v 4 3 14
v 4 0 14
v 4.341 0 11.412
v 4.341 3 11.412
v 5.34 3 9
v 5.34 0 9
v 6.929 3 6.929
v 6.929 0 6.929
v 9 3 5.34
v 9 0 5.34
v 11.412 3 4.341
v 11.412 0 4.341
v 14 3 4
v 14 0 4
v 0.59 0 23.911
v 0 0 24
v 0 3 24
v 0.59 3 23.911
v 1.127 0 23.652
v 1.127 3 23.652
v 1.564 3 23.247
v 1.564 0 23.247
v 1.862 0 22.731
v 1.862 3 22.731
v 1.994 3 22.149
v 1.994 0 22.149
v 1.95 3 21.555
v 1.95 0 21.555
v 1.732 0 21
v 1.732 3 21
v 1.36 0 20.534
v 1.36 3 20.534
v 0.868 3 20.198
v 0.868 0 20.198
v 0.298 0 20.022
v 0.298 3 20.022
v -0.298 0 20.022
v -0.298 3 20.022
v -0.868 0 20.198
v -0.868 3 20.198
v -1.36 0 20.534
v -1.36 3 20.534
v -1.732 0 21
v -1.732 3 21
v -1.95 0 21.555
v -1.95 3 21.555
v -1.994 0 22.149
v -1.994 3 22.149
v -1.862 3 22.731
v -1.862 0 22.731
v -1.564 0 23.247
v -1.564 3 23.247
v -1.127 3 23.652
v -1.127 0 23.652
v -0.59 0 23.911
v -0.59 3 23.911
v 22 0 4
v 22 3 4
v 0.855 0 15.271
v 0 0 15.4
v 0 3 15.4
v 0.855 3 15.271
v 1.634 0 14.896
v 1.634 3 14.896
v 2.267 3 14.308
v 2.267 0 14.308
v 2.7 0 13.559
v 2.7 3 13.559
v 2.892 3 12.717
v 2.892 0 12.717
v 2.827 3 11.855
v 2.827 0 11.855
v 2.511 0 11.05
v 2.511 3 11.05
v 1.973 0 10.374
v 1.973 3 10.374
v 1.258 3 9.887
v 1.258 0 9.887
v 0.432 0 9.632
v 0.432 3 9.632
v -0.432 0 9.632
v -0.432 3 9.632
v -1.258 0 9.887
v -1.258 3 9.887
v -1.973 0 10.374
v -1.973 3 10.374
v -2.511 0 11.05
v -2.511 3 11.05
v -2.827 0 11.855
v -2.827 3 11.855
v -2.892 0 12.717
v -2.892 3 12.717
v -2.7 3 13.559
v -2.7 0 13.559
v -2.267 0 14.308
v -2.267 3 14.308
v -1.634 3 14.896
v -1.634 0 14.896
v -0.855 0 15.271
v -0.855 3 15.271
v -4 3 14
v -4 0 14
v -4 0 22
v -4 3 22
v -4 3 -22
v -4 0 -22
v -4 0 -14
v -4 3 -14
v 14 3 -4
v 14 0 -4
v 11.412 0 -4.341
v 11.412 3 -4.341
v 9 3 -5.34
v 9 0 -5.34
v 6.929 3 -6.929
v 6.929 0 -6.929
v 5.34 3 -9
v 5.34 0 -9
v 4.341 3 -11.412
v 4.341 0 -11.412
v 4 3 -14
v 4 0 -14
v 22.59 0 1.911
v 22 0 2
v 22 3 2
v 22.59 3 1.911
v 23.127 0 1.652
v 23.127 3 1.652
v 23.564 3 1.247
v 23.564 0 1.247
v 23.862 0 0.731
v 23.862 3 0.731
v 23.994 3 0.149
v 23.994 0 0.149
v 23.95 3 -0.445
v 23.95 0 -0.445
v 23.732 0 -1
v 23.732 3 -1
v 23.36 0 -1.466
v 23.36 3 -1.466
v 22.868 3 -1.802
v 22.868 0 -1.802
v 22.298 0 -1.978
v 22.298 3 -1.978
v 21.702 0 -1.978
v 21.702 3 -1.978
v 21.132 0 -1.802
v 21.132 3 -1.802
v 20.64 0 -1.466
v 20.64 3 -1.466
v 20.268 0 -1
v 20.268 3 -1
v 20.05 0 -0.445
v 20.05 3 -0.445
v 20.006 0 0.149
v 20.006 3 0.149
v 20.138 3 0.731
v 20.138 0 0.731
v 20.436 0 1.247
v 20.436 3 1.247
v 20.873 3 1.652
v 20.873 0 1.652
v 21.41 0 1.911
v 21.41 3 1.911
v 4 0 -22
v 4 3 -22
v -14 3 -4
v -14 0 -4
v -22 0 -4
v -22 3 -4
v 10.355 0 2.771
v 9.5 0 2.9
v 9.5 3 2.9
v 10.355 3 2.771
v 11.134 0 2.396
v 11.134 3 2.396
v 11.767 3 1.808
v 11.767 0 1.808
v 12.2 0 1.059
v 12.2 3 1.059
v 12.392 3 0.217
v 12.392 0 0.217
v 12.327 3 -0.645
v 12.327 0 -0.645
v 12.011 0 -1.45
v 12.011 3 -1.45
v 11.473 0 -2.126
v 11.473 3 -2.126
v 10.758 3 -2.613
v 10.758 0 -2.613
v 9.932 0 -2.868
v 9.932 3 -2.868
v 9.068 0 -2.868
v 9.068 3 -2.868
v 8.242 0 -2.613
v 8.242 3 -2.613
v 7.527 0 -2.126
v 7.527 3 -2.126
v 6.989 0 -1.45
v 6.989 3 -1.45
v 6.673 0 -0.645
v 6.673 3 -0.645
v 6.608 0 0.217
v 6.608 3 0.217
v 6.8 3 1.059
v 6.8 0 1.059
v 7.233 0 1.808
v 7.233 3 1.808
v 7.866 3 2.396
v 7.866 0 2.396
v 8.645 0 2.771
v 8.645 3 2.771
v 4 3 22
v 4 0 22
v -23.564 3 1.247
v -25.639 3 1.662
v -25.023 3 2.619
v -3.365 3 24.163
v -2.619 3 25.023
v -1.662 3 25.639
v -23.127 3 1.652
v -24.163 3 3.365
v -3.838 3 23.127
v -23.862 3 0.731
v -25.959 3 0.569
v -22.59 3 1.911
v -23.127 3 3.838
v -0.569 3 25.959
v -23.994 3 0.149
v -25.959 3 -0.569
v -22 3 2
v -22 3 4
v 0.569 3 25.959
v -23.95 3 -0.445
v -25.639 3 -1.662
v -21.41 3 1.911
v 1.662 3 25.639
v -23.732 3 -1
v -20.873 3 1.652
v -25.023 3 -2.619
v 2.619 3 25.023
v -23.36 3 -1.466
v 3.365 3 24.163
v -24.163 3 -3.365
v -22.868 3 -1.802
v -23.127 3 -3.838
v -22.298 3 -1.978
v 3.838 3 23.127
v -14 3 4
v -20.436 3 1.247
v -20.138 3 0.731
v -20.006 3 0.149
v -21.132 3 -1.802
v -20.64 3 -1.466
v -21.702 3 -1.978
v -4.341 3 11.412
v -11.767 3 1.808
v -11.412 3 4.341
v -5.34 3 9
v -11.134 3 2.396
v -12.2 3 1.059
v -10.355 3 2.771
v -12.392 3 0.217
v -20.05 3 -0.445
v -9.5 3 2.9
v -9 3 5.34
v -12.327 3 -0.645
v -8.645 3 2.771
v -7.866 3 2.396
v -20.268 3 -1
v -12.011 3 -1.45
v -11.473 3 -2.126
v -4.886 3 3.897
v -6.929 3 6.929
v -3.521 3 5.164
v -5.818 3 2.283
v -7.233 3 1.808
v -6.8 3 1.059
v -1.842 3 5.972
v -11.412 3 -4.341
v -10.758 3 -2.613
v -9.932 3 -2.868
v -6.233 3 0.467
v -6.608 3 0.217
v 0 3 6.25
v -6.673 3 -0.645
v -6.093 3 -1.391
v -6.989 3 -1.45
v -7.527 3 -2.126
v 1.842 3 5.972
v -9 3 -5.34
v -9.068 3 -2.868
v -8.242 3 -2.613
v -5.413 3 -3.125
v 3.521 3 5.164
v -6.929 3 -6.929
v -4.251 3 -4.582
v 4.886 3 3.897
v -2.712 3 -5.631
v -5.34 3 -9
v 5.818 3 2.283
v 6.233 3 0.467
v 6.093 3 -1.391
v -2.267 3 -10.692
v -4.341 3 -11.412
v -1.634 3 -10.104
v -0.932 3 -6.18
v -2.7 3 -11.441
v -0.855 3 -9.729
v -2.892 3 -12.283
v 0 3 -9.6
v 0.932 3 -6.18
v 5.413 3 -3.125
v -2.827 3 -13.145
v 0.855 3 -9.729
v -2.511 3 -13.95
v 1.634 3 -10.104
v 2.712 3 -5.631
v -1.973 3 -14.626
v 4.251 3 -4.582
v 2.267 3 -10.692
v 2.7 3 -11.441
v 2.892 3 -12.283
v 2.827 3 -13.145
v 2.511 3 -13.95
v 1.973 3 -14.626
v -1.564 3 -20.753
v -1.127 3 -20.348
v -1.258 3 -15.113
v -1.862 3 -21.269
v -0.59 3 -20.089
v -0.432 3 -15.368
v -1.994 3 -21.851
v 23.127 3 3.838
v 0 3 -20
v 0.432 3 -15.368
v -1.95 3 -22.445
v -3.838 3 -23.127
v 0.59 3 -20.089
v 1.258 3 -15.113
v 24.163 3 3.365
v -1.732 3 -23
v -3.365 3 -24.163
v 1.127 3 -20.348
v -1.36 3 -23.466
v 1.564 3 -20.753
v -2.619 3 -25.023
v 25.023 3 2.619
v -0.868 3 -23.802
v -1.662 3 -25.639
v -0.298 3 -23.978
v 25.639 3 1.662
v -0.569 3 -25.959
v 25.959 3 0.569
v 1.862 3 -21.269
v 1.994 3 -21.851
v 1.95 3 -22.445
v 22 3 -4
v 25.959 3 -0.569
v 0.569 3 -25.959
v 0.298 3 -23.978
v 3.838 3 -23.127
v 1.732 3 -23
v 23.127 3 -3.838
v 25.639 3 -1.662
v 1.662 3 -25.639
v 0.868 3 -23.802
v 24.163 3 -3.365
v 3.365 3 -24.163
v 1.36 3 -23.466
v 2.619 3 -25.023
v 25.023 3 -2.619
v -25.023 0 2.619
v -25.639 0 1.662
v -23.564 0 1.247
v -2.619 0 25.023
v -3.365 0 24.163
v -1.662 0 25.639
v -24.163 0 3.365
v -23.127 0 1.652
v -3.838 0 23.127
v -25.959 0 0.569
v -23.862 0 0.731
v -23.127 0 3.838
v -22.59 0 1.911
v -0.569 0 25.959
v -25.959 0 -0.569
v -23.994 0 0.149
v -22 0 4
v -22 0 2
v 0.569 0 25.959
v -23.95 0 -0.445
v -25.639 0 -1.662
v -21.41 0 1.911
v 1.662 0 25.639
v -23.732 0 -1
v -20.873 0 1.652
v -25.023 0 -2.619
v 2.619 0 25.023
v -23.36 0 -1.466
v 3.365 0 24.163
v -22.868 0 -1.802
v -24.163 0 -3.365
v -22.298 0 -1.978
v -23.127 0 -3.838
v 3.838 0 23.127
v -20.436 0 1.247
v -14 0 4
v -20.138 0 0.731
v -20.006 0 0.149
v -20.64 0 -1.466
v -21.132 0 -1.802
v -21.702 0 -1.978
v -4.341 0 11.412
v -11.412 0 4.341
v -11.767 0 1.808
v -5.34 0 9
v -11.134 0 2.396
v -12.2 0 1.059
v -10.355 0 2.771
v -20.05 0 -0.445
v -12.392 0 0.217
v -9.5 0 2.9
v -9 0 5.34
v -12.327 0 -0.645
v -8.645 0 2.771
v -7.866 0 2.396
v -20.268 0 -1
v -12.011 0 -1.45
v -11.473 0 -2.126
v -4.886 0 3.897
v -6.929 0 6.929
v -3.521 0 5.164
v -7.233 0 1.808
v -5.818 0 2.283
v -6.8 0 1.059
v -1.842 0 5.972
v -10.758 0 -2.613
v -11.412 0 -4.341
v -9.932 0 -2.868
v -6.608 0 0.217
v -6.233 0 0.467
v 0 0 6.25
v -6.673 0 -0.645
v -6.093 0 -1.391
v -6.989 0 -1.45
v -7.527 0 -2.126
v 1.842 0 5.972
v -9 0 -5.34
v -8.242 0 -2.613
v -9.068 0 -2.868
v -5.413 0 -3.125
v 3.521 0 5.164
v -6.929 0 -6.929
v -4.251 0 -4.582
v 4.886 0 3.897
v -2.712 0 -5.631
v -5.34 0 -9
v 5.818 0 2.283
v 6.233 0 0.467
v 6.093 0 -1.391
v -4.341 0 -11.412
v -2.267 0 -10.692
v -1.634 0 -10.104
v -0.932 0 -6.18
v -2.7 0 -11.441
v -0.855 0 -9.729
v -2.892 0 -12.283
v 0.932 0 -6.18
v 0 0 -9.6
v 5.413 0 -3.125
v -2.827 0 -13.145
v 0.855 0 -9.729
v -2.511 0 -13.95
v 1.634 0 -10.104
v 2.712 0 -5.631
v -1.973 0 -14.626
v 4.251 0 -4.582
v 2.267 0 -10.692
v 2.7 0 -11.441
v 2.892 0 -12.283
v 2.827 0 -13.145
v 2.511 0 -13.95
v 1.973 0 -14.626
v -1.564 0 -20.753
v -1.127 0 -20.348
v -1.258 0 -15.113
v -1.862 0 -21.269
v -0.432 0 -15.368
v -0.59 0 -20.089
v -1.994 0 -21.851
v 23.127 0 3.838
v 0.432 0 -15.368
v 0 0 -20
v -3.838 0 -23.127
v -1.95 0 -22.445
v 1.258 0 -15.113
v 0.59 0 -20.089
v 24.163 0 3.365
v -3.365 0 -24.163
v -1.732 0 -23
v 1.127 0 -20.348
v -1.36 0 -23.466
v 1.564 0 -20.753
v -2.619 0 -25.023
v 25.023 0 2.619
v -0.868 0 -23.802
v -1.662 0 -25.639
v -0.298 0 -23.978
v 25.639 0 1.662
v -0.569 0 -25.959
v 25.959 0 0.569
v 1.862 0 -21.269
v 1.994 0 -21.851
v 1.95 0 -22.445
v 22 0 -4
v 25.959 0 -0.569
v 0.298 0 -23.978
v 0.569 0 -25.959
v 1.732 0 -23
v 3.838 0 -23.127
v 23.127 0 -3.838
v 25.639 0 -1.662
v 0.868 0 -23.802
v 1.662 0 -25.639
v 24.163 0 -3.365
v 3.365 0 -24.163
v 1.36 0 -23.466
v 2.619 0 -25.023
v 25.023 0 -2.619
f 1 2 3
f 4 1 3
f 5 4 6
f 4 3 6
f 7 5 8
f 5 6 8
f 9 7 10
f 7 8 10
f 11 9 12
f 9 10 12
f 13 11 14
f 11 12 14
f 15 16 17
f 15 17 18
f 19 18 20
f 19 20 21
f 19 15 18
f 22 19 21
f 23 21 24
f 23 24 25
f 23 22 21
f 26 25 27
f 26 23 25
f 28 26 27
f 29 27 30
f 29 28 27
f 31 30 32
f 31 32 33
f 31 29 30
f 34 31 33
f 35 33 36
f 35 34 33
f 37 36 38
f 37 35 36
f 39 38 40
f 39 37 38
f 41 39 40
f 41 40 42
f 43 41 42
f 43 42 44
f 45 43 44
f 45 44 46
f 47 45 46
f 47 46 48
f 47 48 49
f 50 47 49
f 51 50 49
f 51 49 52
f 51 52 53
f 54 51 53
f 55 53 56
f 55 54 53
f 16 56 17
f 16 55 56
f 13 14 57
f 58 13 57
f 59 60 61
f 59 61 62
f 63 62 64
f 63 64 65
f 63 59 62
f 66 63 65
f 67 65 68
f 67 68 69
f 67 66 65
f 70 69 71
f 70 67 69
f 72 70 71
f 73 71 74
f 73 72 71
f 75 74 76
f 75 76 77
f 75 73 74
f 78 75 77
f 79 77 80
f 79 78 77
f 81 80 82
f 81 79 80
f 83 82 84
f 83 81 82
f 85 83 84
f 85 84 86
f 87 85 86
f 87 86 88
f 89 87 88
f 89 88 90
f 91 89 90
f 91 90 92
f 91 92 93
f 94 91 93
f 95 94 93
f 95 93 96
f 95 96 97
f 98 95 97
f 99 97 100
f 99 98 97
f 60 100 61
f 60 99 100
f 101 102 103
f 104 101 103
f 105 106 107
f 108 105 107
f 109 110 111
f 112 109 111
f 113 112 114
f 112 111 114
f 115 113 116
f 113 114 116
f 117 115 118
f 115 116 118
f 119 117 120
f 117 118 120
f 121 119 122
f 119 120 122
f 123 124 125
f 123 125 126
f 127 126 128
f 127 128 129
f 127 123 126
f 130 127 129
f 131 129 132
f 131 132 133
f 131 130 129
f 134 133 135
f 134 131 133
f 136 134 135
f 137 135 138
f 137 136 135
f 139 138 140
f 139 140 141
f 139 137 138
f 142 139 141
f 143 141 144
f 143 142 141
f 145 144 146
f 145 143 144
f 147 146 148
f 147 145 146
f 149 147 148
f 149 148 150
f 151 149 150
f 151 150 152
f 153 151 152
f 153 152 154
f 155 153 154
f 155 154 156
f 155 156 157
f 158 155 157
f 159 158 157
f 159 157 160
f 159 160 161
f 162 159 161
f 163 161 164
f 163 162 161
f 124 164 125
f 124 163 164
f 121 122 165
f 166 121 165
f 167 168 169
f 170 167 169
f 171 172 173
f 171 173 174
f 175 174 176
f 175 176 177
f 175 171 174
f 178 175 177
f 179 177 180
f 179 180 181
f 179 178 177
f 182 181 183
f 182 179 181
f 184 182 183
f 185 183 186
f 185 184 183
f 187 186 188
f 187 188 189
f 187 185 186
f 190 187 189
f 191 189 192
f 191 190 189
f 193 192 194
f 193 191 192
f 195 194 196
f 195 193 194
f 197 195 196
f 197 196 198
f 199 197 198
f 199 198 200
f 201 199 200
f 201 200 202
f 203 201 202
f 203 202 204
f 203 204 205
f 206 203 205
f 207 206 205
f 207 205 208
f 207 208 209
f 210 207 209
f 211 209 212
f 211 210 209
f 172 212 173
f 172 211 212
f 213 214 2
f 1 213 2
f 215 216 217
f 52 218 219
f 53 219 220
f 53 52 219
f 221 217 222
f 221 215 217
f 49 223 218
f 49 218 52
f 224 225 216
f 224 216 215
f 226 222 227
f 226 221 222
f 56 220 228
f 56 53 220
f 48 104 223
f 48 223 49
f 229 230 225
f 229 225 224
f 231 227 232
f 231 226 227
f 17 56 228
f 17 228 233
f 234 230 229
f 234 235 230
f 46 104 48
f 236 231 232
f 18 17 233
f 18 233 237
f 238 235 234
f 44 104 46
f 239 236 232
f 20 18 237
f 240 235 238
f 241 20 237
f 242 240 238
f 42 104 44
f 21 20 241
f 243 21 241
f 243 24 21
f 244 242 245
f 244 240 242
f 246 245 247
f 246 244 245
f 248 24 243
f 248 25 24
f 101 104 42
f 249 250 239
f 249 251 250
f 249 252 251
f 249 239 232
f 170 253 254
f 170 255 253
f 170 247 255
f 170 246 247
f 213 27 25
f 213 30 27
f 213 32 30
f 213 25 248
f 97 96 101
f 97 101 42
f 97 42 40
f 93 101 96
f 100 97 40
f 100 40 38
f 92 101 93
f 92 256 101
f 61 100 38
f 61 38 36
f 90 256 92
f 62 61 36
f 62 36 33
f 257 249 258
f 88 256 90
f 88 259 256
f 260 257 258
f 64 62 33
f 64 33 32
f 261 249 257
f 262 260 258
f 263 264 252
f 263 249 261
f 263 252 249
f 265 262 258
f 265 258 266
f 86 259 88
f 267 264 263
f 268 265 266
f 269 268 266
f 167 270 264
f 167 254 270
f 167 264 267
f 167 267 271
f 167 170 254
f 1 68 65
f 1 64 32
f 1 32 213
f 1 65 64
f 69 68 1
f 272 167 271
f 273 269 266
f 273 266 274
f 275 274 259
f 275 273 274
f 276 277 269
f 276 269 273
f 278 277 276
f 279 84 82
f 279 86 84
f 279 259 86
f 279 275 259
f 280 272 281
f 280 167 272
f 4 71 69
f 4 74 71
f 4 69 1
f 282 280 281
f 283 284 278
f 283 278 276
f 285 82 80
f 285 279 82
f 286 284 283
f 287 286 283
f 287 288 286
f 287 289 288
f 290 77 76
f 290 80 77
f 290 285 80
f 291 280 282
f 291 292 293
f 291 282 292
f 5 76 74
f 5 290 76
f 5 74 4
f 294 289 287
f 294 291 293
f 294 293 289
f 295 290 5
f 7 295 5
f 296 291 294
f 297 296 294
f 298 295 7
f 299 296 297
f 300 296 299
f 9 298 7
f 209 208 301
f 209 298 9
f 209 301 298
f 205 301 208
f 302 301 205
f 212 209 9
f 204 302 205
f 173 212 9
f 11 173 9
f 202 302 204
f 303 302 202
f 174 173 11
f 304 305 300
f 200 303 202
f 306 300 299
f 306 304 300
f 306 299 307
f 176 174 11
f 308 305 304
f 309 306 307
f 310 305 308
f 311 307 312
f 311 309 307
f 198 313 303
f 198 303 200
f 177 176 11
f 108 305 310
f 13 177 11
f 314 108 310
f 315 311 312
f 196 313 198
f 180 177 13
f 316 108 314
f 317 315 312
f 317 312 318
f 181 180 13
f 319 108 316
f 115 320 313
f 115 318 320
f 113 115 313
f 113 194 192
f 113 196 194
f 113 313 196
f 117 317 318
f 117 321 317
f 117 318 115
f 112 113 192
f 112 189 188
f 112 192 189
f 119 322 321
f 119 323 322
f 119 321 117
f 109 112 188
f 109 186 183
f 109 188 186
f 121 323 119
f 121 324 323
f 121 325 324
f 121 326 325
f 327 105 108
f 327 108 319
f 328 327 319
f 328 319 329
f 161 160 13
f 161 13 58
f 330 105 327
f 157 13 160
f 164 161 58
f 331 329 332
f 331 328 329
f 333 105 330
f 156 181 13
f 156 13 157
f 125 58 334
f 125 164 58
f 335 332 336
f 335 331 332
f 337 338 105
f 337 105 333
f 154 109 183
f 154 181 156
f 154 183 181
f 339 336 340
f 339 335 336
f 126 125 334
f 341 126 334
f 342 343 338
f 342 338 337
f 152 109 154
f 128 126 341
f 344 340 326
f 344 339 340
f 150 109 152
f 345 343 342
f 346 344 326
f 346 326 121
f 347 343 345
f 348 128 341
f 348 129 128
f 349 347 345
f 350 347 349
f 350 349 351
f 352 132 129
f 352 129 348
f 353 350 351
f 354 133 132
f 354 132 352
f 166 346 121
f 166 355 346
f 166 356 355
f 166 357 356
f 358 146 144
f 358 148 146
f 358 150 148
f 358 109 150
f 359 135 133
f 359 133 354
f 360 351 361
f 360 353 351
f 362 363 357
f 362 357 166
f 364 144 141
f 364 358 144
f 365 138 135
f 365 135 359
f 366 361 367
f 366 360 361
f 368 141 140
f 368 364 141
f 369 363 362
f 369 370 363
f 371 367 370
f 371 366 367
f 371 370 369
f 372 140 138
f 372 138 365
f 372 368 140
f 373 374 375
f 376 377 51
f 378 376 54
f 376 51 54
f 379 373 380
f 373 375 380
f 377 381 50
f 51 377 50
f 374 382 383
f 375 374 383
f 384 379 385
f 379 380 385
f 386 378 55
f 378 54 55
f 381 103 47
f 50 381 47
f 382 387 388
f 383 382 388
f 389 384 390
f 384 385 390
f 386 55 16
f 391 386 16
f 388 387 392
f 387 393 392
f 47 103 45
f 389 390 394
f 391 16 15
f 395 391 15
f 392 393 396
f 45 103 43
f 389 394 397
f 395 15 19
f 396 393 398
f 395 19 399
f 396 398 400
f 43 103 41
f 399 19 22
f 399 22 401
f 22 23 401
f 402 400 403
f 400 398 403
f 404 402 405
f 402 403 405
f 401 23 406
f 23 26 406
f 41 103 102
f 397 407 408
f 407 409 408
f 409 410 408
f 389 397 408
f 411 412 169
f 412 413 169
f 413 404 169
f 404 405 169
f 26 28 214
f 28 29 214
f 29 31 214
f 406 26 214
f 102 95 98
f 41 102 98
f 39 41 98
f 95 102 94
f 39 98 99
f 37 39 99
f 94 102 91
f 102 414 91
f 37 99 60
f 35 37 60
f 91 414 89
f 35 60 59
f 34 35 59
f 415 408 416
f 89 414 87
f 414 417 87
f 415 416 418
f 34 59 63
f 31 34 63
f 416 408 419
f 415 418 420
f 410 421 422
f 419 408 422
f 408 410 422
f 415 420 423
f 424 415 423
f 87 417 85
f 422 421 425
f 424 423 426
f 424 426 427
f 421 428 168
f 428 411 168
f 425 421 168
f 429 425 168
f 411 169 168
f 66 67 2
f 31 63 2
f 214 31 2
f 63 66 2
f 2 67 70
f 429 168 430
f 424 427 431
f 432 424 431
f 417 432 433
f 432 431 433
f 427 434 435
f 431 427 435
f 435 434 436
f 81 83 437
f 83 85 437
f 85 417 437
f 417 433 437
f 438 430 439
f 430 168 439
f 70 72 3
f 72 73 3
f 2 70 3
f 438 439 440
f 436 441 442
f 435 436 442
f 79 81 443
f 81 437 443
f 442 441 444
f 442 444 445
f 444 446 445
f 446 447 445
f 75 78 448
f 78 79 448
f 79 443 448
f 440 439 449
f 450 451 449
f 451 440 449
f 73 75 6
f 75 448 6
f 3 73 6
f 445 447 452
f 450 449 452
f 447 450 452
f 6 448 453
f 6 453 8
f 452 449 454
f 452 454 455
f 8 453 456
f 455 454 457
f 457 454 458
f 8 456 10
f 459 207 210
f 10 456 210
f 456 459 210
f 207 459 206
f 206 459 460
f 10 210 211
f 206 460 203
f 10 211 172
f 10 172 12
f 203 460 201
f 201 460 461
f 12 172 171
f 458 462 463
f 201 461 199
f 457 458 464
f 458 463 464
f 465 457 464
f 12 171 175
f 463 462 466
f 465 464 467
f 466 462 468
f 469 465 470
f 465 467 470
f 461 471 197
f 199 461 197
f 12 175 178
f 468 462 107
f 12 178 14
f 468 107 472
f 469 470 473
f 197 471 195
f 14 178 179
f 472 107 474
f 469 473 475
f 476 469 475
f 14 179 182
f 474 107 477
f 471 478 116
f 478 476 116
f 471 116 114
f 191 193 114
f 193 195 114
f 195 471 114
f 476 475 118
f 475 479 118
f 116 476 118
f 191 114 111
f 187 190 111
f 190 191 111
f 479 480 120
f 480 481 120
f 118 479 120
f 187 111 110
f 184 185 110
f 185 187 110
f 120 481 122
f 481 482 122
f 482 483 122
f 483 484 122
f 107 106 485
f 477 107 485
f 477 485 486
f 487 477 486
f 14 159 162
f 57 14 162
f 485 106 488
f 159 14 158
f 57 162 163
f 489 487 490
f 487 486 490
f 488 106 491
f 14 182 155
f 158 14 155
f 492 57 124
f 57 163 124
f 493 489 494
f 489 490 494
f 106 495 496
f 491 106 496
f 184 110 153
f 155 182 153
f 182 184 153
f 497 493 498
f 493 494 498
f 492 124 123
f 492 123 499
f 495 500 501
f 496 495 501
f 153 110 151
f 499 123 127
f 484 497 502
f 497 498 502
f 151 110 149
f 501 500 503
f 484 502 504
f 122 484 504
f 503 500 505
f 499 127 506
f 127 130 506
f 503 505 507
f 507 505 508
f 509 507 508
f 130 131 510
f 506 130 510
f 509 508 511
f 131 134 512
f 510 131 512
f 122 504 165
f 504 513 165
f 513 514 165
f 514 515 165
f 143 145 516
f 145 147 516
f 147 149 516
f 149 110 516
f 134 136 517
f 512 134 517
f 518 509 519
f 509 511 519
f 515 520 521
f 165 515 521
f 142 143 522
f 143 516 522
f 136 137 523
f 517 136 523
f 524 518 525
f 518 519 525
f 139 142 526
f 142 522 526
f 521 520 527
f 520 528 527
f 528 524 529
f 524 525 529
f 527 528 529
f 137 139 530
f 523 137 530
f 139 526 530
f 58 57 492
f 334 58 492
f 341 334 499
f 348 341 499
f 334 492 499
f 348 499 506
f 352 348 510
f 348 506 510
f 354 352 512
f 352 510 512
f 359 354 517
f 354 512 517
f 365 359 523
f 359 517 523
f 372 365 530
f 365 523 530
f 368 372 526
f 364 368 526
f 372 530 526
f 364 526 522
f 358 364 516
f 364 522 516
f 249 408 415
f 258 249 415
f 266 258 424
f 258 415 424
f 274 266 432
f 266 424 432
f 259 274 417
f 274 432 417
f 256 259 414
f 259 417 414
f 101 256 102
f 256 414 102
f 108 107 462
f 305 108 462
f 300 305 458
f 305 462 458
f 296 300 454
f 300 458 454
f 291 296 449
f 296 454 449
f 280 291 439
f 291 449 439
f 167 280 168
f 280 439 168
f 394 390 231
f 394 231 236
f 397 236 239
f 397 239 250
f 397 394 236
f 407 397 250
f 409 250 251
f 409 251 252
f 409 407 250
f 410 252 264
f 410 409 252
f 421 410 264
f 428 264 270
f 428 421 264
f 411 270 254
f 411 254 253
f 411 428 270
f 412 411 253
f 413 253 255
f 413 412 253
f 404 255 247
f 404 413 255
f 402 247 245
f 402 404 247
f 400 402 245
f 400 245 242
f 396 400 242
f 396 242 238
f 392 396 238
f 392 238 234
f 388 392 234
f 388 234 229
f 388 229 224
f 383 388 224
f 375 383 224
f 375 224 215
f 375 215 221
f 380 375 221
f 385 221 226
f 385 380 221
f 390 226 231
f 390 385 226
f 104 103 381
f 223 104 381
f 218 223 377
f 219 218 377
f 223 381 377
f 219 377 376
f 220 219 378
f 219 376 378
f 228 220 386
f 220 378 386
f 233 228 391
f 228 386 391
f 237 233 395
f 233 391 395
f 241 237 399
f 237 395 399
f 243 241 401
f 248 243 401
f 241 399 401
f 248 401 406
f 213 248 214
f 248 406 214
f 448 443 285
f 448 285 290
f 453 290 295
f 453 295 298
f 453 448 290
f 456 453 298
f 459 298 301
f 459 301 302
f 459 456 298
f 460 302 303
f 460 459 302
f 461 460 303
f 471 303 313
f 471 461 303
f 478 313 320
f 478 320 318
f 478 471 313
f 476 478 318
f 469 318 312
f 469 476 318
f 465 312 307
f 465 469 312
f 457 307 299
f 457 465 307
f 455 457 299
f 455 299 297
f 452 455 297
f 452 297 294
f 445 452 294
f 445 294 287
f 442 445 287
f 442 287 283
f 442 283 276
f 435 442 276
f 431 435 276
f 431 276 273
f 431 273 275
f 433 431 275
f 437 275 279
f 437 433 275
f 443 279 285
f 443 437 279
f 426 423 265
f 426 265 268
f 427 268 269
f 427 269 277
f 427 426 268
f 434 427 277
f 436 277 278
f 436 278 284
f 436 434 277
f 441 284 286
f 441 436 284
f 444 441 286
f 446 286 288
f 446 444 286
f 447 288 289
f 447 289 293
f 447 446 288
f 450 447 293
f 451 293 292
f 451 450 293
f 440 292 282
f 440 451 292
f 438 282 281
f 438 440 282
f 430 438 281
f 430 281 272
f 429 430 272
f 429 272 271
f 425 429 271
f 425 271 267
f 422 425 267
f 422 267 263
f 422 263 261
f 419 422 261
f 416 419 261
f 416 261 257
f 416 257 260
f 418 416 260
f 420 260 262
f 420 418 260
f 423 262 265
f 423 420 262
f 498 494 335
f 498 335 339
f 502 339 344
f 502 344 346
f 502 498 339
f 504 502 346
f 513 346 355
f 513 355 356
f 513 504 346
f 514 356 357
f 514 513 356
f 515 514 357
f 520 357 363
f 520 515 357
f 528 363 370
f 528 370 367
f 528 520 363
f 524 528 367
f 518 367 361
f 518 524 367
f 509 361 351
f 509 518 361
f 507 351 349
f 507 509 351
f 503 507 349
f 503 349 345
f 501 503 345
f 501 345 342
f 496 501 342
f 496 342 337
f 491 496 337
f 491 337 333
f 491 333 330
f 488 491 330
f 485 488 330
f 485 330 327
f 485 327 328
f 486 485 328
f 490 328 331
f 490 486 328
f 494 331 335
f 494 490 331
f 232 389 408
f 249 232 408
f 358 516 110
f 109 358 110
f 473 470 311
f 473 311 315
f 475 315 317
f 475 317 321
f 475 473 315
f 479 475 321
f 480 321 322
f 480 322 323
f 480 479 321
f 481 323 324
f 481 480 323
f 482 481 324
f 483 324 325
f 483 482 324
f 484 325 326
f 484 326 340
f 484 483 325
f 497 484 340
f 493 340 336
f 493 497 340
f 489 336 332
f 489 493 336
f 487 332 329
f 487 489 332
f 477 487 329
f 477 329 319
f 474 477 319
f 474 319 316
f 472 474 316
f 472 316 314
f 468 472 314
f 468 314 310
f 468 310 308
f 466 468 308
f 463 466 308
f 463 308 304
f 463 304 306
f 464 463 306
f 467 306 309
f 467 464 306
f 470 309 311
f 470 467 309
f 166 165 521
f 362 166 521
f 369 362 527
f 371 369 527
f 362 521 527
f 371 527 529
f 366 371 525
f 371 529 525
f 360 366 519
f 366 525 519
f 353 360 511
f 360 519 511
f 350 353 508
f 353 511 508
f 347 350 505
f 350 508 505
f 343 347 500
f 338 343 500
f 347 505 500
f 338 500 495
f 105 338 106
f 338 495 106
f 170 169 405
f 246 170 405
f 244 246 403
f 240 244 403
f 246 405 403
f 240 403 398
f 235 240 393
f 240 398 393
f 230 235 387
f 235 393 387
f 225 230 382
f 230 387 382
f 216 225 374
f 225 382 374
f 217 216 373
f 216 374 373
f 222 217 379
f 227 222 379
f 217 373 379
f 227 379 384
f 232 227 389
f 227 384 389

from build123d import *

# Parameters (mm, degrees)
IZIM2_R                     = 2
IZIM2_R_2                   = 2.9
IZIM2_R_3                   = 6.25
Y_KSEKLIK_EKSTR_ZYON1_DEPTH = 3


with BuildPart() as part:
    # Çizim2 → Yükseklik-Ekstrüzyon1 (new body)
    with BuildSketch(Plane(origin=(0, 0, 0), x_dir=(1, 0, 0), z_dir=(0, 1, 0))):
        with BuildLine():
            ThreePointArc((4, 22), (0, 26), (-4, 22))
            Line((-4, 22), (-4, 14))
            ThreePointArc((-4, 14), (-6.928932188, 6.928932188), (-14, 4))
            Line((-14, 4), (-22, 4))
            ThreePointArc((-22, 4), (-26, 0), (-22, -4))
            Line((-22, -4), (-14, -4))
            ThreePointArc((-14, -4), (-6.928932188, -6.928932188), (-4, -14))
            Line((-4, -14), (-4, -22))
            ThreePointArc((-4, -22), (0, -26), (4, -22))
            Line((4, -22), (4, -14))
            ThreePointArc((4, -14), (6.928932188, -6.928932188), (14, -4))
            Line((14, -4), (22, -4))
            ThreePointArc((22, -4), (26, 0), (22, 4))
            Line((22, 4), (14, 4))
            ThreePointArc((14, 4), (6.928932188, 6.928932188), (4, 14))
            Line((4, 14), (4, 22))
        make_face()
        with Locations(Location((0, -22, 0), (0, 0, 270))):
            Circle(IZIM2_R, mode=Mode.SUBTRACT)
        with Locations(Location((0, -12.5, 0), (0, 0, 270))):
            Circle(IZIM2_R_2, mode=Mode.SUBTRACT)
        with Locations(Location((-22, 0, 0), (0, 0, 270))):
            Circle(IZIM2_R, mode=Mode.SUBTRACT)
        with Locations(Location((-9.5, 0, 0), (0, 0, 270))):
            Circle(IZIM2_R_2, mode=Mode.SUBTRACT)
        with Locations(Location((0, 0, 0), (0, 0, 270))):
            Circle(IZIM2_R_3, mode=Mode.SUBTRACT)
        with Locations(Location((9.5, 0, 0), (0, 0, 270))):
            Circle(IZIM2_R_2, mode=Mode.SUBTRACT)
        with Locations(Location((0, 12.5, 0), (0, 0, 270))):
            Circle(IZIM2_R_2, mode=Mode.SUBTRACT)
        with Locations(Location((0, 22, 0), (0, 0, 270))):
            Circle(IZIM2_R, mode=Mode.SUBTRACT)
        with Locations(Location((22, 0, 0), (0, 0, 270))):
            Circle(IZIM2_R, mode=Mode.SUBTRACT)
    extrude(amount=Y_KSEKLIK_EKSTR_ZYON1_DEPTH)


solid = part.part
